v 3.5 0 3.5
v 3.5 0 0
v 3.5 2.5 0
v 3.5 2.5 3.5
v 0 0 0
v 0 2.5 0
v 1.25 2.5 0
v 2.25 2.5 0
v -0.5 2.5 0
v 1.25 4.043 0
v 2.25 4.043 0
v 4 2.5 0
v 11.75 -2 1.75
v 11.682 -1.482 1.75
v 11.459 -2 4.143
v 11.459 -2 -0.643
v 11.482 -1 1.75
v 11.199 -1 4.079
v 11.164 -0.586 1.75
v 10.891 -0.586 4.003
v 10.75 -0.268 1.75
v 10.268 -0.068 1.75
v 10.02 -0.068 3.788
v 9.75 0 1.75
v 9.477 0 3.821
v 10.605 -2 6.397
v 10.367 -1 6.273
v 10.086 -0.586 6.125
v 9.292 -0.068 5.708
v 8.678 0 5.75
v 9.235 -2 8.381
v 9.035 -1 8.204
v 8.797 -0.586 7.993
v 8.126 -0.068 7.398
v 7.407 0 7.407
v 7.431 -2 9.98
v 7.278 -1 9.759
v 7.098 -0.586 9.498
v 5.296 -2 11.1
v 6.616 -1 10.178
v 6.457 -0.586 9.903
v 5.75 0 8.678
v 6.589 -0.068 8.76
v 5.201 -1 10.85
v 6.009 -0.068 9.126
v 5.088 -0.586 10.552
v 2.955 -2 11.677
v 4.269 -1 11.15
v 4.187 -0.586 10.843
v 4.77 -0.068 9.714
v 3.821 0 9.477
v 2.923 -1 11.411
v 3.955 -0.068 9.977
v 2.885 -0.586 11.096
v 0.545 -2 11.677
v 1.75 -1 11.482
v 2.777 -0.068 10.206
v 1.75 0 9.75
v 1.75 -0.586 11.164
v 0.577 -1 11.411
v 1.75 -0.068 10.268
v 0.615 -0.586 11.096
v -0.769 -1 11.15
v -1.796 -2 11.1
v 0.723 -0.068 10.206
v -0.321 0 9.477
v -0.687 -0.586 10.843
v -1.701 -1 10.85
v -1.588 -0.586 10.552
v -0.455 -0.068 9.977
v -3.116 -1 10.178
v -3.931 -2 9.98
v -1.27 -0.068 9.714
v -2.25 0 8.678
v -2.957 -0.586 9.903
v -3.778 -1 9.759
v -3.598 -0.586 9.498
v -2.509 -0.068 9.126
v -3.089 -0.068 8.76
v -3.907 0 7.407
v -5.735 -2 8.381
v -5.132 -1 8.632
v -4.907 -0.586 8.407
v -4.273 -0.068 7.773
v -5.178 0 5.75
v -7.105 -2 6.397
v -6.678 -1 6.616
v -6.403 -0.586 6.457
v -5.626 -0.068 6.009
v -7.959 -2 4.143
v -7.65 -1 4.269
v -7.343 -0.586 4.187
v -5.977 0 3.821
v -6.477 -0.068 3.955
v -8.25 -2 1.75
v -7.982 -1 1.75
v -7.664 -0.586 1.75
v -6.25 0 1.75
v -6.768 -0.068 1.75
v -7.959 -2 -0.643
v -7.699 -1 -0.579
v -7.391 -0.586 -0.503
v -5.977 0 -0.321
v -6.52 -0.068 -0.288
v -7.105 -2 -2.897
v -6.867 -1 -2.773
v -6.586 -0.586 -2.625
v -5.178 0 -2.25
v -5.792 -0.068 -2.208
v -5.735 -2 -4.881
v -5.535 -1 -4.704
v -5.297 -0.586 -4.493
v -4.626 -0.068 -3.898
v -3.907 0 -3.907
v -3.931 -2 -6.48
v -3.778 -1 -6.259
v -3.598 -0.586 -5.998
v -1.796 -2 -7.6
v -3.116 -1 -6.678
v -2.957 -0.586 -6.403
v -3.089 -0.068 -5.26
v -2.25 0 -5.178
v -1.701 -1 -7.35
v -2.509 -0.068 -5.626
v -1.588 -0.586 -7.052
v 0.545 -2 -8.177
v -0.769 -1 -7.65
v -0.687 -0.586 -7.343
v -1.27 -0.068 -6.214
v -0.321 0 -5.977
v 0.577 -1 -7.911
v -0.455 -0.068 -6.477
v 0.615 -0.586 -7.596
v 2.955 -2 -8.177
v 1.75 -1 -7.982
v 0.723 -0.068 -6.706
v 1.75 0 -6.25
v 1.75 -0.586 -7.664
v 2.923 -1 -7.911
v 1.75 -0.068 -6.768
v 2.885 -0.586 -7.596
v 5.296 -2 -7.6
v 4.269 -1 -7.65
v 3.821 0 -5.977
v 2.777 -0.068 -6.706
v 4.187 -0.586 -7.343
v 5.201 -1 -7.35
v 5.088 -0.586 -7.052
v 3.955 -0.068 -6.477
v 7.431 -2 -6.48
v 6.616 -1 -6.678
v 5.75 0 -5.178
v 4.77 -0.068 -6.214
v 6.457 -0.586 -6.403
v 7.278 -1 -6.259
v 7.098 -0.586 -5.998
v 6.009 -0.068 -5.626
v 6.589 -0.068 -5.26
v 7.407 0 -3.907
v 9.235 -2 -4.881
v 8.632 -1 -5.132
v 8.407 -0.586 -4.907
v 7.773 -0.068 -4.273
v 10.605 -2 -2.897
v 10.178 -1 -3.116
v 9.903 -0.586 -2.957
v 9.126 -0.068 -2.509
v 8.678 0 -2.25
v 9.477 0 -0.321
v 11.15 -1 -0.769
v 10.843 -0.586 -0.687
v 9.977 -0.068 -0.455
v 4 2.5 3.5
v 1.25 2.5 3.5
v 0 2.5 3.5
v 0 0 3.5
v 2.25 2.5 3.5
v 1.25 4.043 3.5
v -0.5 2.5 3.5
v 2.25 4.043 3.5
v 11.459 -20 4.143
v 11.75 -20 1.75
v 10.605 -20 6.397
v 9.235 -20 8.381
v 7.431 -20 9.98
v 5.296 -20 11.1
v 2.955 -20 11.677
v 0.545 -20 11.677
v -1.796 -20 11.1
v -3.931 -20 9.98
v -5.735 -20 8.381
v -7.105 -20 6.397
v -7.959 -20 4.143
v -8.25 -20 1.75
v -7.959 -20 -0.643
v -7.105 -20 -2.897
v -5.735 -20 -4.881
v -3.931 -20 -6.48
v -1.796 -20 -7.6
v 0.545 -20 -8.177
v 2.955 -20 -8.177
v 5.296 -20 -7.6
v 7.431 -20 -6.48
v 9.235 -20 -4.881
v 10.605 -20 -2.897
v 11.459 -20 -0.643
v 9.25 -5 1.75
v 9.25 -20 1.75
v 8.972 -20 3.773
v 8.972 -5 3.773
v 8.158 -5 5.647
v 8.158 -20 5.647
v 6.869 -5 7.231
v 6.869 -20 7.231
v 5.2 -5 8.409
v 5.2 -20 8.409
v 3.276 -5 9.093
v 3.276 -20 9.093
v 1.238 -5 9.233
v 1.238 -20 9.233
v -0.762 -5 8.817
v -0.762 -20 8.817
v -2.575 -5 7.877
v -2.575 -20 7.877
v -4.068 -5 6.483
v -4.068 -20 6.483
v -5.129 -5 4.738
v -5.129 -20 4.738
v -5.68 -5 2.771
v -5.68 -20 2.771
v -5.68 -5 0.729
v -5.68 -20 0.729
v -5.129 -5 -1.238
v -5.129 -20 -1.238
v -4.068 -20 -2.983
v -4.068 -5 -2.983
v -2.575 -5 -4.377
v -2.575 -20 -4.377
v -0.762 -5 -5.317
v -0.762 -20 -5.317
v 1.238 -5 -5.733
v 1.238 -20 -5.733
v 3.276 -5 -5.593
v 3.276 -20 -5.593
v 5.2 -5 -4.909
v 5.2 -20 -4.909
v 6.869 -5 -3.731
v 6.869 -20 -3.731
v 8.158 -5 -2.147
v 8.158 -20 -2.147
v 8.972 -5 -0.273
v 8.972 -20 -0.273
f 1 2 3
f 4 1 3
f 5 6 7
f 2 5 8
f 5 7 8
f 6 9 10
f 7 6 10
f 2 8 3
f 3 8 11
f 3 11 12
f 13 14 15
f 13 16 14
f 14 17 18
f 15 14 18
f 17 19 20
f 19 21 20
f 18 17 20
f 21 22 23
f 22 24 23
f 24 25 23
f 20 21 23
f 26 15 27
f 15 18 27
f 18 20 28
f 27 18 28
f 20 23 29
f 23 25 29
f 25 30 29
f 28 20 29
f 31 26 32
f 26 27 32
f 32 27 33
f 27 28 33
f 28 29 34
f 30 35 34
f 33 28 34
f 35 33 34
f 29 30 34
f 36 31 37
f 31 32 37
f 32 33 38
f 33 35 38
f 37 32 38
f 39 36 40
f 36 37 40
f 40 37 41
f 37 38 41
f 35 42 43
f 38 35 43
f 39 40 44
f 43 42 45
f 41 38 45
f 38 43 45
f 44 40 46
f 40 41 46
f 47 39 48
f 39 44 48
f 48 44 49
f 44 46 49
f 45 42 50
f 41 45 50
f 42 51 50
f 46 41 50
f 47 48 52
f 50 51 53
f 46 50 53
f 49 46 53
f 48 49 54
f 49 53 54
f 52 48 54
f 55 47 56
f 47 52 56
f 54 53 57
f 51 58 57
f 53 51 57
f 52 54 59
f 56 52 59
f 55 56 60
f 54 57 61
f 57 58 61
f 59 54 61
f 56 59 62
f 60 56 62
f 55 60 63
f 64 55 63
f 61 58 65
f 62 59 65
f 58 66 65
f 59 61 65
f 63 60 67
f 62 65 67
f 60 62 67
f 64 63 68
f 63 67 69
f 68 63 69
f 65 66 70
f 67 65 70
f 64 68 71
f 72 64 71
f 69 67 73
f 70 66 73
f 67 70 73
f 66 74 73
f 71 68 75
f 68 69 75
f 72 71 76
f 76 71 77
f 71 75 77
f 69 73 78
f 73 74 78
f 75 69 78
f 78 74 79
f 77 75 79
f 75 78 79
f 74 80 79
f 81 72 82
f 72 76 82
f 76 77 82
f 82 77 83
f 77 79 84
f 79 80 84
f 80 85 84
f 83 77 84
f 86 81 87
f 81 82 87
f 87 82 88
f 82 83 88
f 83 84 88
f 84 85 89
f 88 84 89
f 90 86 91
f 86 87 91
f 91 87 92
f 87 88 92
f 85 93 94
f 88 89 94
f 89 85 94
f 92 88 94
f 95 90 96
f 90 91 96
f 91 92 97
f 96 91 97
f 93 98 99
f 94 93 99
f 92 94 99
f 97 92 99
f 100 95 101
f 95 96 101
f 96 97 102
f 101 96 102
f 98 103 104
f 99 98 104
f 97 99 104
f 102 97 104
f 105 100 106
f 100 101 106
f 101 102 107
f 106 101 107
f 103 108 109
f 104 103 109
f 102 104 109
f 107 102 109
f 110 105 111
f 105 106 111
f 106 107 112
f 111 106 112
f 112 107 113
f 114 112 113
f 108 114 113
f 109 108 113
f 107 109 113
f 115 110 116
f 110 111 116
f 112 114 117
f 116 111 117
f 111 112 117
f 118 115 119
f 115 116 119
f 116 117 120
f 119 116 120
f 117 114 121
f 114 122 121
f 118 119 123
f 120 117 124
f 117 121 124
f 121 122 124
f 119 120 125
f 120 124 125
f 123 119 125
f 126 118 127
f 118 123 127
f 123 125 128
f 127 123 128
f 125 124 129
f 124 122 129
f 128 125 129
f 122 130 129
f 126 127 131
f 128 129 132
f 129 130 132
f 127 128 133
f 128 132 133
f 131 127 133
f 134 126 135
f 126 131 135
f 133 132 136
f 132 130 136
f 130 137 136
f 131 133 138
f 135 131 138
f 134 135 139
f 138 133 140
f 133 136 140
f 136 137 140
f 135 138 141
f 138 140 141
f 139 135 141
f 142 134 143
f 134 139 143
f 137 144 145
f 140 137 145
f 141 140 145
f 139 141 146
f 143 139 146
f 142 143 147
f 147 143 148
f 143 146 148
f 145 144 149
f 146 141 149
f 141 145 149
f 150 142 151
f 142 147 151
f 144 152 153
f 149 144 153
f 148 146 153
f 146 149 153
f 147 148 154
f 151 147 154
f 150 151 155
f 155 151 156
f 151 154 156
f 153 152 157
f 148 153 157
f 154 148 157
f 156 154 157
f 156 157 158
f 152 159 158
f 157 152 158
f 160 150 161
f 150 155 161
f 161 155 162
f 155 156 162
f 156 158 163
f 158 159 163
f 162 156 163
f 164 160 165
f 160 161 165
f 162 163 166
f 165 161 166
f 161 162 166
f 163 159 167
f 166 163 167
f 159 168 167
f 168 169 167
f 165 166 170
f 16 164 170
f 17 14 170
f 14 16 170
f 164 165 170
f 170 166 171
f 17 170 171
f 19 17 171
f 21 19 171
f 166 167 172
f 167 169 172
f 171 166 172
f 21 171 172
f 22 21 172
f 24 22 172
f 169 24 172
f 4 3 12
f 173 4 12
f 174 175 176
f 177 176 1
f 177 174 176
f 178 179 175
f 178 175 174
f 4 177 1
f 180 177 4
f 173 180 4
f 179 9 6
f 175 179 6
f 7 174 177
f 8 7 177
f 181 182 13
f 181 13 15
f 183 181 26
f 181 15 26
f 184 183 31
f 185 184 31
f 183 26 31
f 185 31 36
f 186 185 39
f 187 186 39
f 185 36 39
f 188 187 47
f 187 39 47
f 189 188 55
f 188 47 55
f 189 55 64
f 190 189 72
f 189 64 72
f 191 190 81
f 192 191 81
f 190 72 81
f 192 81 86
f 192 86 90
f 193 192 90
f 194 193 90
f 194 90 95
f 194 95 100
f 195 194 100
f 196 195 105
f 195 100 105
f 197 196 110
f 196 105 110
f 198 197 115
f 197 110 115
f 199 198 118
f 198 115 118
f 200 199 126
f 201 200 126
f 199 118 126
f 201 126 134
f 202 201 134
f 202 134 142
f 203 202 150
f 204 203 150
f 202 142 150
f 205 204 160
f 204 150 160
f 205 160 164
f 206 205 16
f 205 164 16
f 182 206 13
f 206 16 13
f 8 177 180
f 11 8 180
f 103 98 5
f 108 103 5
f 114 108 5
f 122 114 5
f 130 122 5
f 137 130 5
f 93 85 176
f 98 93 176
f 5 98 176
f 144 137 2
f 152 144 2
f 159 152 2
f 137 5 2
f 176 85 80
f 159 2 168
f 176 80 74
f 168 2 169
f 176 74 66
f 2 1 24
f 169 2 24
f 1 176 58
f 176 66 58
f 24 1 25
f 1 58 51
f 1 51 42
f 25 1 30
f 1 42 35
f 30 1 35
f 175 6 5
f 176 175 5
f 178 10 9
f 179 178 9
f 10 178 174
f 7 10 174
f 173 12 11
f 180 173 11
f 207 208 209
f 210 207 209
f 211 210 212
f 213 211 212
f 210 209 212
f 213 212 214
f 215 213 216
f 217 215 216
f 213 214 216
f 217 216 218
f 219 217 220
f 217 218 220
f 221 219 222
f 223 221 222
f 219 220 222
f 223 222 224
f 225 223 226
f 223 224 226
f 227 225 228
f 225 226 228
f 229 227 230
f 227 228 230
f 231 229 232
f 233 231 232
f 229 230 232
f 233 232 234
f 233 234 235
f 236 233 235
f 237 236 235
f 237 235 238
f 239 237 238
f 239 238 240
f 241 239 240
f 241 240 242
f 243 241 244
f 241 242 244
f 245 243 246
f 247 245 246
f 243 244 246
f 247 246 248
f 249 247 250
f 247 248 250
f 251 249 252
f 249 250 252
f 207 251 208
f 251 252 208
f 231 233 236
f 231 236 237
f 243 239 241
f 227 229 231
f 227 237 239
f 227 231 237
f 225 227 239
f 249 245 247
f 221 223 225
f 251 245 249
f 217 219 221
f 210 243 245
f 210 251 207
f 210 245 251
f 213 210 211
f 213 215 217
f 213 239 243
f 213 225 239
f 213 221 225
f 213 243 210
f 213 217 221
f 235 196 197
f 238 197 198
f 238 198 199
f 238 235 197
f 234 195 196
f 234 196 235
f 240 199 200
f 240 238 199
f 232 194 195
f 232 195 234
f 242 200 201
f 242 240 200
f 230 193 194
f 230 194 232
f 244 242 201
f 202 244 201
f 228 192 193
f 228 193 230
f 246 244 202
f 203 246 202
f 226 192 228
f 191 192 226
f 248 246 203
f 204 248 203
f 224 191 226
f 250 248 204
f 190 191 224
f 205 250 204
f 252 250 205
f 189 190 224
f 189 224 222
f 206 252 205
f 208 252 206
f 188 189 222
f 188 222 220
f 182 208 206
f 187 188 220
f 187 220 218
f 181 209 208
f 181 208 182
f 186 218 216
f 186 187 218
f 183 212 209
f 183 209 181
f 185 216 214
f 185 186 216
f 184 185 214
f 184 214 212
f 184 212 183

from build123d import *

# Parameters (mm, degrees)
F1_DEPTH = 3.5
F2_W     = 1
F2_H     = 3.968627
F3_DEPTH = 25
F4_R     = 10
F5_DEPTH = 20
F6_R     = 2
F7_R     = 7.5
F8_DEPTH = 15


with BuildPart() as f1:
    # F0 (on Top) → F1 (new body)
    with BuildSketch(Plane.XY):
        Polygon((0, 2.5), (0, 0), (3.5, 0), (3.5, 2.5), (4, 2.5), (1.75, 4.484313), (-0.5, 2.5), align=None)
    extrude(amount=F1_DEPTH)

    # F2 (on face) → F3 (cut)
    with BuildSketch(Plane.XY.offset(3.5)):
        with Locations((1.75, 4.484313)):
            Rectangle(F2_W, F2_H)
        Polygon((1.25, 4.043355), (1.25, 2.5), (2.25, 2.5), (2.25, 4.043355), (1.75, 4.484313), align=None)
    extrude(amount=-F3_DEPTH, mode=Mode.SUBTRACT)

    # F4 (on face) → F5 (join)
    with BuildSketch(Plane.XZ):
        with Locations((1.75, 1.75)):
            Circle(F4_R)
    extrude(amount=F5_DEPTH)

    # F6
    f6_edges = [f1.edges().sort_by_distance(p)[0] for p in [
        (-8.25, 0, 1.75),
    ]]
    fillet(f6_edges, radius=F6_R)

    # F7 (on face) → F8 (cut)
    with BuildSketch(Plane.XZ.offset(20)):
        with Locations((1.75, 1.75)):
            Circle(F7_R)
    extrude(amount=-F8_DEPTH, mode=Mode.SUBTRACT)


solid = f1.part
